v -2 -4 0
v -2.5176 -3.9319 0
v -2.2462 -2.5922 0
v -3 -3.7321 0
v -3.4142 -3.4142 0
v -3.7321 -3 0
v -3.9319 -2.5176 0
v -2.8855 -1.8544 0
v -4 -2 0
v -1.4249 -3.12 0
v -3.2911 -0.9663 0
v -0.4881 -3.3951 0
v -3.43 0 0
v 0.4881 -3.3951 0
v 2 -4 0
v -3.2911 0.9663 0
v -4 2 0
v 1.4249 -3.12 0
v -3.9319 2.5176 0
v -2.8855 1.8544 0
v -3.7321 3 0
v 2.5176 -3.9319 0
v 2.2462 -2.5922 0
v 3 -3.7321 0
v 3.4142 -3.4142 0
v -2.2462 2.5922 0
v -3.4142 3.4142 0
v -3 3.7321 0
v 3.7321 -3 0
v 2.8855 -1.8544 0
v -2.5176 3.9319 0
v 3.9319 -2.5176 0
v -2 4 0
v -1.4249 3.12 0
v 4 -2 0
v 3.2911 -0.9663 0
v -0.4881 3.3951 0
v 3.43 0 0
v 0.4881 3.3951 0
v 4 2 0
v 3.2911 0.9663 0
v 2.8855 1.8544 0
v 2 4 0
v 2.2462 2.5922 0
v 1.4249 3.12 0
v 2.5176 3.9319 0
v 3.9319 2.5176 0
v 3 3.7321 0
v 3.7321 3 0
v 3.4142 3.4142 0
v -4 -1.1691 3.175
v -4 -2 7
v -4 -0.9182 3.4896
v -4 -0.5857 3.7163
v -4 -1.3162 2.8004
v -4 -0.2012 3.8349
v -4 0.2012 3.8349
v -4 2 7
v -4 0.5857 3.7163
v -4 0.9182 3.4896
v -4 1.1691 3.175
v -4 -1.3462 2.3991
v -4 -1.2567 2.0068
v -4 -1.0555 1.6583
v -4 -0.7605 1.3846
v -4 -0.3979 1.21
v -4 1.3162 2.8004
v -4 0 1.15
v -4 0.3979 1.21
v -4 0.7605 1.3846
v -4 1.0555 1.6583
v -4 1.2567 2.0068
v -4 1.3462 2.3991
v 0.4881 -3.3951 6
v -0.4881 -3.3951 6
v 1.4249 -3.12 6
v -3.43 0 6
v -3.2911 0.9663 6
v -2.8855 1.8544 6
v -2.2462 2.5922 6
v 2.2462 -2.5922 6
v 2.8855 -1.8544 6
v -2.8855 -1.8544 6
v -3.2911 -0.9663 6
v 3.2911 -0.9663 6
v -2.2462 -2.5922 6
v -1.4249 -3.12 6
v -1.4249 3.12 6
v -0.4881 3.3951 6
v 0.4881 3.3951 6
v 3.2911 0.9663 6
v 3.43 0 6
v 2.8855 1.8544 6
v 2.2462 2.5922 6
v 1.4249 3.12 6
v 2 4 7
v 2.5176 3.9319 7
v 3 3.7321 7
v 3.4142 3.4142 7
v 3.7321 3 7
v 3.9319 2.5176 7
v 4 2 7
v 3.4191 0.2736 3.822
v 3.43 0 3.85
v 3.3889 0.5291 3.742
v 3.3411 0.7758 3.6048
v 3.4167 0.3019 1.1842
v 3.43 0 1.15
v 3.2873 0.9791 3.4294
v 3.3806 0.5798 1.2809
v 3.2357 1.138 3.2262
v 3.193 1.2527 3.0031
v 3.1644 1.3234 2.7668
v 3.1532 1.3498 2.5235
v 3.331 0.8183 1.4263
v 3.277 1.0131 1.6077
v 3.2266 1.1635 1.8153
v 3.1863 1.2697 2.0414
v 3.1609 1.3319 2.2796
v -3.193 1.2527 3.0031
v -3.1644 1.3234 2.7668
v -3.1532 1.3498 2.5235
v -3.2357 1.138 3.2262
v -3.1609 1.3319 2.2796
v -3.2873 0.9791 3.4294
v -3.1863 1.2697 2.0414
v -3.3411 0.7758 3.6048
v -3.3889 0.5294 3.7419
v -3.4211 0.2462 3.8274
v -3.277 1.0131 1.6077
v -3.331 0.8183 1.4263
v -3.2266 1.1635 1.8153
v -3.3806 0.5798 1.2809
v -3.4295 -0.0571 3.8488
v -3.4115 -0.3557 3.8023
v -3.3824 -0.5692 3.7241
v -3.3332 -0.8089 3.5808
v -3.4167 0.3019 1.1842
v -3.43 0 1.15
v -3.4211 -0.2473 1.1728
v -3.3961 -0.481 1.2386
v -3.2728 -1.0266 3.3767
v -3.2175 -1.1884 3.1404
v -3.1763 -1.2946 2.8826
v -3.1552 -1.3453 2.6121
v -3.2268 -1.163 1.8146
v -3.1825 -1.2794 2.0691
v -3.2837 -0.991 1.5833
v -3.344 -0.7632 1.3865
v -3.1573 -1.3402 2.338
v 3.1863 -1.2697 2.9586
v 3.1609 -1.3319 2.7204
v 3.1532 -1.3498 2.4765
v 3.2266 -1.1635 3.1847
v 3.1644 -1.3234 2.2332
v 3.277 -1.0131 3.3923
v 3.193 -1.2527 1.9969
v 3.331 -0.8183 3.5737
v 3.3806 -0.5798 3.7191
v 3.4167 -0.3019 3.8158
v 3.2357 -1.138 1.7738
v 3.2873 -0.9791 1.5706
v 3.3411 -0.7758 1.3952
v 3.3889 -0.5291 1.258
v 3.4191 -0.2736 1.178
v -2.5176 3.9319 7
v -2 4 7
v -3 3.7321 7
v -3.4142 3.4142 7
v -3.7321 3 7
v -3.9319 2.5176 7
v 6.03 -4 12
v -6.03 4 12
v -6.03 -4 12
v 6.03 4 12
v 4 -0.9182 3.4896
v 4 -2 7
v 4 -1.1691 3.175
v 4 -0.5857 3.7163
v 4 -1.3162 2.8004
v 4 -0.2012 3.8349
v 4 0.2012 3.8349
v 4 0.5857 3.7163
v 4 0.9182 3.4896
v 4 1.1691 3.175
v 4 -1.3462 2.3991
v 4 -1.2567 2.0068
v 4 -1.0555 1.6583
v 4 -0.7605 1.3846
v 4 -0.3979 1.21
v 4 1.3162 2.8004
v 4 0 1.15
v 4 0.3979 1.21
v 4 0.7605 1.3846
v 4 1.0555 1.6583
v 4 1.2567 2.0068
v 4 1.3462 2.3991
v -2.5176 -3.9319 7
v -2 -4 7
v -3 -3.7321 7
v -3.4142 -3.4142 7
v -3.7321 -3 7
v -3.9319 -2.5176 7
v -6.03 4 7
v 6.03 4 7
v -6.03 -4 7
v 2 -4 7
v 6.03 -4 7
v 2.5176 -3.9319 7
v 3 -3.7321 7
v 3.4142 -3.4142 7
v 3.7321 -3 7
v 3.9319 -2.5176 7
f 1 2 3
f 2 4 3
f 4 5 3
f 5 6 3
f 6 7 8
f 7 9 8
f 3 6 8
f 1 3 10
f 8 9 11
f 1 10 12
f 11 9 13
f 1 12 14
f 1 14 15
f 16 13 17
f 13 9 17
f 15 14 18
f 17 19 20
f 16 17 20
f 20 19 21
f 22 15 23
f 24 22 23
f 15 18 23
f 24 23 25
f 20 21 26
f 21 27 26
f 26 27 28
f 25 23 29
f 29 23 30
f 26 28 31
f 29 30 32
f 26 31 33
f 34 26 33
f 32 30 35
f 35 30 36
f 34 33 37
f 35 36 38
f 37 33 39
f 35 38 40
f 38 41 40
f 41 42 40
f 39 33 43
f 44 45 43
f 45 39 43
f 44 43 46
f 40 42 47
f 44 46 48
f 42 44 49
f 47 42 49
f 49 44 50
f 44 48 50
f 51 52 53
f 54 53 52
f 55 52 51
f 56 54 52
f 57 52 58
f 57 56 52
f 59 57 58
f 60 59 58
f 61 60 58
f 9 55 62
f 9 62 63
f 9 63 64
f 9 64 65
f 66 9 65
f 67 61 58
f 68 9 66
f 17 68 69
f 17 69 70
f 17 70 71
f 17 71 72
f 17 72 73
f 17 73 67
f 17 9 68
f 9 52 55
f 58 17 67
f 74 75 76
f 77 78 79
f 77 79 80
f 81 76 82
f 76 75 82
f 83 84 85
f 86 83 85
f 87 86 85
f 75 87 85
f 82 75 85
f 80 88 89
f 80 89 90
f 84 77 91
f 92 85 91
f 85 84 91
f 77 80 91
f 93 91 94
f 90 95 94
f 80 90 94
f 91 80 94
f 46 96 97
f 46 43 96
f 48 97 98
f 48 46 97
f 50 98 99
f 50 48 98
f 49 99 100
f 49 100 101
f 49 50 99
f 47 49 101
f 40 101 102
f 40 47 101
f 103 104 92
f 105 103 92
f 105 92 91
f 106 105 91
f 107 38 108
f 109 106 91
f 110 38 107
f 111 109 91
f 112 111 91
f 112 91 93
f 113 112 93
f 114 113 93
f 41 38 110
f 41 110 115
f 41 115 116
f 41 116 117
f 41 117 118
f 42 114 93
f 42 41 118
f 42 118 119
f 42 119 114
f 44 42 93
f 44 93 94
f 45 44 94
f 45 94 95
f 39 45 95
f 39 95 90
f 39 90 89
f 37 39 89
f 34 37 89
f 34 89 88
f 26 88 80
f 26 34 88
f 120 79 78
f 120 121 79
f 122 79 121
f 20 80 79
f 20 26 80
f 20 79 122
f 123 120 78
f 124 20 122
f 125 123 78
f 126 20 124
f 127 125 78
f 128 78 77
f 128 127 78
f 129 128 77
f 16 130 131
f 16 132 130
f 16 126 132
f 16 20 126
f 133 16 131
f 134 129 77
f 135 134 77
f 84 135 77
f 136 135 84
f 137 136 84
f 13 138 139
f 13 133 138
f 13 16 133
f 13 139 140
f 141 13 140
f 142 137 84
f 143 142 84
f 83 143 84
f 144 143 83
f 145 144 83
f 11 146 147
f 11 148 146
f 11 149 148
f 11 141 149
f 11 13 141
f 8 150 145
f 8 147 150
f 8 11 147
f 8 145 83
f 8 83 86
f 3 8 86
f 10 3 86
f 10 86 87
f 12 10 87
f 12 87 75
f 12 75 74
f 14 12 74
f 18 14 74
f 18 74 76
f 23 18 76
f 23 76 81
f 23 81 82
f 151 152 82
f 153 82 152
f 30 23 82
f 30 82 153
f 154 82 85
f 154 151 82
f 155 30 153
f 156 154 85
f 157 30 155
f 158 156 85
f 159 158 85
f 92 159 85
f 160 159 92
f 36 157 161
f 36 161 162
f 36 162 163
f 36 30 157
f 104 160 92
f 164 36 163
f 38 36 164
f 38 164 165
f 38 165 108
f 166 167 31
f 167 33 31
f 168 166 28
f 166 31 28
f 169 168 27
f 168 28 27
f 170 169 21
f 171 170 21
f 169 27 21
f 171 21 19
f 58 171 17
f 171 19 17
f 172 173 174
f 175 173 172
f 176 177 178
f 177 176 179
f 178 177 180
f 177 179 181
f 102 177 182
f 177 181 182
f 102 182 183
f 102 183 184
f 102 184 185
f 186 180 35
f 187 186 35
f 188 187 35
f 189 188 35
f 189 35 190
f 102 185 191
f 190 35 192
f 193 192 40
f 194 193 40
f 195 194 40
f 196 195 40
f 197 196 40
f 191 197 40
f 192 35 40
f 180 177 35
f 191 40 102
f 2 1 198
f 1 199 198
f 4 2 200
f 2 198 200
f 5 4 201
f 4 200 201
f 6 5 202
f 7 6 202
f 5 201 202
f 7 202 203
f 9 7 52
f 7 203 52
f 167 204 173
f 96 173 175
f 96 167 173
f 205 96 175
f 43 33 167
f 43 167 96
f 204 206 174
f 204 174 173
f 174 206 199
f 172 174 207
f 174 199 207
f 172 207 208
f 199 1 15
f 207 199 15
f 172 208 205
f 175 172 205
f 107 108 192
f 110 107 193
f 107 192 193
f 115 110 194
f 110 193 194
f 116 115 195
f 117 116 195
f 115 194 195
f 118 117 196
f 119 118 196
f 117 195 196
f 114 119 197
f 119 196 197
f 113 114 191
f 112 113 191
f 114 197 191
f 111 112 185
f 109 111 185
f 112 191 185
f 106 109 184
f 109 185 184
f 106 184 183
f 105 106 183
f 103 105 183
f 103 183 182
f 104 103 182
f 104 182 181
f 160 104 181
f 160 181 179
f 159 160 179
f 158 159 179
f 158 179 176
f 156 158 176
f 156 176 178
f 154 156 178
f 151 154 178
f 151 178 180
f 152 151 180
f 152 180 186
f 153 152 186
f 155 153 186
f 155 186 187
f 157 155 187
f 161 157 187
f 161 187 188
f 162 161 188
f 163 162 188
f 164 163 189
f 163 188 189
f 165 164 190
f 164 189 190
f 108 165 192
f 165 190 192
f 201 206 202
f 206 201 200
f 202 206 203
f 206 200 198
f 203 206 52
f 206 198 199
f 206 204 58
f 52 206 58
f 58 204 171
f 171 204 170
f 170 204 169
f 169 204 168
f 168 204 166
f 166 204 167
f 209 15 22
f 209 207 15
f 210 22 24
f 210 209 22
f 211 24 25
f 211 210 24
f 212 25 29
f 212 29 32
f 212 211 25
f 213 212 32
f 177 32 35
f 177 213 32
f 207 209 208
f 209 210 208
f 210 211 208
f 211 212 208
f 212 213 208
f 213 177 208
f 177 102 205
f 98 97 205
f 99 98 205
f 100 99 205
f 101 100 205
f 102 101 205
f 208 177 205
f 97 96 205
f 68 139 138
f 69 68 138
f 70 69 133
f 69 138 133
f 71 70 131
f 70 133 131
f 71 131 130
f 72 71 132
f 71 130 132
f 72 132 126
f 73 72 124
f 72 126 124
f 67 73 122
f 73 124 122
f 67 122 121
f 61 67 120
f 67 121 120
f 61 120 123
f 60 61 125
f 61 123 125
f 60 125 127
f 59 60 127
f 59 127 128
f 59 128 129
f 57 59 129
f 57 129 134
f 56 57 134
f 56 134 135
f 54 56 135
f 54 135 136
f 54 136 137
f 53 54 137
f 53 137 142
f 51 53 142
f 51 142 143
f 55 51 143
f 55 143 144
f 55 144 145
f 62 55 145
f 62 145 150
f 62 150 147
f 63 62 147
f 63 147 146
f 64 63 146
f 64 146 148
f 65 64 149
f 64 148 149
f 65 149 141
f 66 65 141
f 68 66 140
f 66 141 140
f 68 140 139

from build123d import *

# Parameters (mm, degrees)
SKETCH_1_W             = 8
SKETCH_1_H             = 8
EXTRUDE_1_DEPTH        = 7
SKETCH_1_3_OUTSIDE_W   = 12.66
SKETCH_1_3_OUTSIDE_H   = 12.66
SKETCH_1_3_OUTSIDE_W_2 = 8
SKETCH_1_3_OUTSIDE_H_2 = 8
SKETCH_1_3_OUTSIDE_R   = 3.43
CUT_EXTRUDE_1_DEPTH    = 6
SKETCH_4_R             = 1.35
CUT_EXTRUDE_2_DEPTH    = 12.6
SKETCH_8_W             = 12.06
SKETCH_8_H             = 8
EXTRUDE_3_DEPTH        = 5
FILLET_1_R             = 2


with BuildPart() as part:
    # 스케치1 → 보스-돌출1 (new body)
    with BuildSketch(Plane.XY):
        Rectangle(SKETCH_1_W, SKETCH_1_H)
    extrude(amount=EXTRUDE_1_DEPTH)

    # 스케치1<3> outside → 컷-돌출1 (cut)
    # profile 1 of 2: a face of its own
    with BuildSketch(Plane.XY):
        Rectangle(SKETCH_1_3_OUTSIDE_W, SKETCH_1_3_OUTSIDE_H)
        Rectangle(SKETCH_1_3_OUTSIDE_W_2, SKETCH_1_3_OUTSIDE_H_2, mode=Mode.SUBTRACT)
    # profile 2 of 2: a face of its own
    with BuildSketch(Plane.XY):
        Circle(SKETCH_1_3_OUTSIDE_R)
    extrude(amount=CUT_EXTRUDE_1_DEPTH, mode=Mode.SUBTRACT)

    # 스케치4 → 컷-돌출2 (cut)
    with BuildSketch(Plane(origin=(4, 0, 0), x_dir=(0, 0, -1), z_dir=(1, 0, 0))):
        with Locations((-2.5, 0)):
            Circle(SKETCH_4_R)
    extrude(amount=-CUT_EXTRUDE_2_DEPTH, mode=Mode.SUBTRACT)

    # 스케치8 → 보스-돌출3 (add)
    with BuildSketch(Plane.XY.offset(7)):
        Rectangle(SKETCH_8_W, SKETCH_8_H)
    extrude(amount=EXTRUDE_3_DEPTH)

    # 필렛1
    fillet_1_edges = [part.edges().sort_by_distance(p)[0] for p in [
        (-4, -4, 3.5),
        (4, -4, 3.5),
        (4, 4, 3.5),
        (-4, 4, 3.5),
    ]]
    fillet(fillet_1_edges, radius=FILLET_1_R)


solid = part.part
